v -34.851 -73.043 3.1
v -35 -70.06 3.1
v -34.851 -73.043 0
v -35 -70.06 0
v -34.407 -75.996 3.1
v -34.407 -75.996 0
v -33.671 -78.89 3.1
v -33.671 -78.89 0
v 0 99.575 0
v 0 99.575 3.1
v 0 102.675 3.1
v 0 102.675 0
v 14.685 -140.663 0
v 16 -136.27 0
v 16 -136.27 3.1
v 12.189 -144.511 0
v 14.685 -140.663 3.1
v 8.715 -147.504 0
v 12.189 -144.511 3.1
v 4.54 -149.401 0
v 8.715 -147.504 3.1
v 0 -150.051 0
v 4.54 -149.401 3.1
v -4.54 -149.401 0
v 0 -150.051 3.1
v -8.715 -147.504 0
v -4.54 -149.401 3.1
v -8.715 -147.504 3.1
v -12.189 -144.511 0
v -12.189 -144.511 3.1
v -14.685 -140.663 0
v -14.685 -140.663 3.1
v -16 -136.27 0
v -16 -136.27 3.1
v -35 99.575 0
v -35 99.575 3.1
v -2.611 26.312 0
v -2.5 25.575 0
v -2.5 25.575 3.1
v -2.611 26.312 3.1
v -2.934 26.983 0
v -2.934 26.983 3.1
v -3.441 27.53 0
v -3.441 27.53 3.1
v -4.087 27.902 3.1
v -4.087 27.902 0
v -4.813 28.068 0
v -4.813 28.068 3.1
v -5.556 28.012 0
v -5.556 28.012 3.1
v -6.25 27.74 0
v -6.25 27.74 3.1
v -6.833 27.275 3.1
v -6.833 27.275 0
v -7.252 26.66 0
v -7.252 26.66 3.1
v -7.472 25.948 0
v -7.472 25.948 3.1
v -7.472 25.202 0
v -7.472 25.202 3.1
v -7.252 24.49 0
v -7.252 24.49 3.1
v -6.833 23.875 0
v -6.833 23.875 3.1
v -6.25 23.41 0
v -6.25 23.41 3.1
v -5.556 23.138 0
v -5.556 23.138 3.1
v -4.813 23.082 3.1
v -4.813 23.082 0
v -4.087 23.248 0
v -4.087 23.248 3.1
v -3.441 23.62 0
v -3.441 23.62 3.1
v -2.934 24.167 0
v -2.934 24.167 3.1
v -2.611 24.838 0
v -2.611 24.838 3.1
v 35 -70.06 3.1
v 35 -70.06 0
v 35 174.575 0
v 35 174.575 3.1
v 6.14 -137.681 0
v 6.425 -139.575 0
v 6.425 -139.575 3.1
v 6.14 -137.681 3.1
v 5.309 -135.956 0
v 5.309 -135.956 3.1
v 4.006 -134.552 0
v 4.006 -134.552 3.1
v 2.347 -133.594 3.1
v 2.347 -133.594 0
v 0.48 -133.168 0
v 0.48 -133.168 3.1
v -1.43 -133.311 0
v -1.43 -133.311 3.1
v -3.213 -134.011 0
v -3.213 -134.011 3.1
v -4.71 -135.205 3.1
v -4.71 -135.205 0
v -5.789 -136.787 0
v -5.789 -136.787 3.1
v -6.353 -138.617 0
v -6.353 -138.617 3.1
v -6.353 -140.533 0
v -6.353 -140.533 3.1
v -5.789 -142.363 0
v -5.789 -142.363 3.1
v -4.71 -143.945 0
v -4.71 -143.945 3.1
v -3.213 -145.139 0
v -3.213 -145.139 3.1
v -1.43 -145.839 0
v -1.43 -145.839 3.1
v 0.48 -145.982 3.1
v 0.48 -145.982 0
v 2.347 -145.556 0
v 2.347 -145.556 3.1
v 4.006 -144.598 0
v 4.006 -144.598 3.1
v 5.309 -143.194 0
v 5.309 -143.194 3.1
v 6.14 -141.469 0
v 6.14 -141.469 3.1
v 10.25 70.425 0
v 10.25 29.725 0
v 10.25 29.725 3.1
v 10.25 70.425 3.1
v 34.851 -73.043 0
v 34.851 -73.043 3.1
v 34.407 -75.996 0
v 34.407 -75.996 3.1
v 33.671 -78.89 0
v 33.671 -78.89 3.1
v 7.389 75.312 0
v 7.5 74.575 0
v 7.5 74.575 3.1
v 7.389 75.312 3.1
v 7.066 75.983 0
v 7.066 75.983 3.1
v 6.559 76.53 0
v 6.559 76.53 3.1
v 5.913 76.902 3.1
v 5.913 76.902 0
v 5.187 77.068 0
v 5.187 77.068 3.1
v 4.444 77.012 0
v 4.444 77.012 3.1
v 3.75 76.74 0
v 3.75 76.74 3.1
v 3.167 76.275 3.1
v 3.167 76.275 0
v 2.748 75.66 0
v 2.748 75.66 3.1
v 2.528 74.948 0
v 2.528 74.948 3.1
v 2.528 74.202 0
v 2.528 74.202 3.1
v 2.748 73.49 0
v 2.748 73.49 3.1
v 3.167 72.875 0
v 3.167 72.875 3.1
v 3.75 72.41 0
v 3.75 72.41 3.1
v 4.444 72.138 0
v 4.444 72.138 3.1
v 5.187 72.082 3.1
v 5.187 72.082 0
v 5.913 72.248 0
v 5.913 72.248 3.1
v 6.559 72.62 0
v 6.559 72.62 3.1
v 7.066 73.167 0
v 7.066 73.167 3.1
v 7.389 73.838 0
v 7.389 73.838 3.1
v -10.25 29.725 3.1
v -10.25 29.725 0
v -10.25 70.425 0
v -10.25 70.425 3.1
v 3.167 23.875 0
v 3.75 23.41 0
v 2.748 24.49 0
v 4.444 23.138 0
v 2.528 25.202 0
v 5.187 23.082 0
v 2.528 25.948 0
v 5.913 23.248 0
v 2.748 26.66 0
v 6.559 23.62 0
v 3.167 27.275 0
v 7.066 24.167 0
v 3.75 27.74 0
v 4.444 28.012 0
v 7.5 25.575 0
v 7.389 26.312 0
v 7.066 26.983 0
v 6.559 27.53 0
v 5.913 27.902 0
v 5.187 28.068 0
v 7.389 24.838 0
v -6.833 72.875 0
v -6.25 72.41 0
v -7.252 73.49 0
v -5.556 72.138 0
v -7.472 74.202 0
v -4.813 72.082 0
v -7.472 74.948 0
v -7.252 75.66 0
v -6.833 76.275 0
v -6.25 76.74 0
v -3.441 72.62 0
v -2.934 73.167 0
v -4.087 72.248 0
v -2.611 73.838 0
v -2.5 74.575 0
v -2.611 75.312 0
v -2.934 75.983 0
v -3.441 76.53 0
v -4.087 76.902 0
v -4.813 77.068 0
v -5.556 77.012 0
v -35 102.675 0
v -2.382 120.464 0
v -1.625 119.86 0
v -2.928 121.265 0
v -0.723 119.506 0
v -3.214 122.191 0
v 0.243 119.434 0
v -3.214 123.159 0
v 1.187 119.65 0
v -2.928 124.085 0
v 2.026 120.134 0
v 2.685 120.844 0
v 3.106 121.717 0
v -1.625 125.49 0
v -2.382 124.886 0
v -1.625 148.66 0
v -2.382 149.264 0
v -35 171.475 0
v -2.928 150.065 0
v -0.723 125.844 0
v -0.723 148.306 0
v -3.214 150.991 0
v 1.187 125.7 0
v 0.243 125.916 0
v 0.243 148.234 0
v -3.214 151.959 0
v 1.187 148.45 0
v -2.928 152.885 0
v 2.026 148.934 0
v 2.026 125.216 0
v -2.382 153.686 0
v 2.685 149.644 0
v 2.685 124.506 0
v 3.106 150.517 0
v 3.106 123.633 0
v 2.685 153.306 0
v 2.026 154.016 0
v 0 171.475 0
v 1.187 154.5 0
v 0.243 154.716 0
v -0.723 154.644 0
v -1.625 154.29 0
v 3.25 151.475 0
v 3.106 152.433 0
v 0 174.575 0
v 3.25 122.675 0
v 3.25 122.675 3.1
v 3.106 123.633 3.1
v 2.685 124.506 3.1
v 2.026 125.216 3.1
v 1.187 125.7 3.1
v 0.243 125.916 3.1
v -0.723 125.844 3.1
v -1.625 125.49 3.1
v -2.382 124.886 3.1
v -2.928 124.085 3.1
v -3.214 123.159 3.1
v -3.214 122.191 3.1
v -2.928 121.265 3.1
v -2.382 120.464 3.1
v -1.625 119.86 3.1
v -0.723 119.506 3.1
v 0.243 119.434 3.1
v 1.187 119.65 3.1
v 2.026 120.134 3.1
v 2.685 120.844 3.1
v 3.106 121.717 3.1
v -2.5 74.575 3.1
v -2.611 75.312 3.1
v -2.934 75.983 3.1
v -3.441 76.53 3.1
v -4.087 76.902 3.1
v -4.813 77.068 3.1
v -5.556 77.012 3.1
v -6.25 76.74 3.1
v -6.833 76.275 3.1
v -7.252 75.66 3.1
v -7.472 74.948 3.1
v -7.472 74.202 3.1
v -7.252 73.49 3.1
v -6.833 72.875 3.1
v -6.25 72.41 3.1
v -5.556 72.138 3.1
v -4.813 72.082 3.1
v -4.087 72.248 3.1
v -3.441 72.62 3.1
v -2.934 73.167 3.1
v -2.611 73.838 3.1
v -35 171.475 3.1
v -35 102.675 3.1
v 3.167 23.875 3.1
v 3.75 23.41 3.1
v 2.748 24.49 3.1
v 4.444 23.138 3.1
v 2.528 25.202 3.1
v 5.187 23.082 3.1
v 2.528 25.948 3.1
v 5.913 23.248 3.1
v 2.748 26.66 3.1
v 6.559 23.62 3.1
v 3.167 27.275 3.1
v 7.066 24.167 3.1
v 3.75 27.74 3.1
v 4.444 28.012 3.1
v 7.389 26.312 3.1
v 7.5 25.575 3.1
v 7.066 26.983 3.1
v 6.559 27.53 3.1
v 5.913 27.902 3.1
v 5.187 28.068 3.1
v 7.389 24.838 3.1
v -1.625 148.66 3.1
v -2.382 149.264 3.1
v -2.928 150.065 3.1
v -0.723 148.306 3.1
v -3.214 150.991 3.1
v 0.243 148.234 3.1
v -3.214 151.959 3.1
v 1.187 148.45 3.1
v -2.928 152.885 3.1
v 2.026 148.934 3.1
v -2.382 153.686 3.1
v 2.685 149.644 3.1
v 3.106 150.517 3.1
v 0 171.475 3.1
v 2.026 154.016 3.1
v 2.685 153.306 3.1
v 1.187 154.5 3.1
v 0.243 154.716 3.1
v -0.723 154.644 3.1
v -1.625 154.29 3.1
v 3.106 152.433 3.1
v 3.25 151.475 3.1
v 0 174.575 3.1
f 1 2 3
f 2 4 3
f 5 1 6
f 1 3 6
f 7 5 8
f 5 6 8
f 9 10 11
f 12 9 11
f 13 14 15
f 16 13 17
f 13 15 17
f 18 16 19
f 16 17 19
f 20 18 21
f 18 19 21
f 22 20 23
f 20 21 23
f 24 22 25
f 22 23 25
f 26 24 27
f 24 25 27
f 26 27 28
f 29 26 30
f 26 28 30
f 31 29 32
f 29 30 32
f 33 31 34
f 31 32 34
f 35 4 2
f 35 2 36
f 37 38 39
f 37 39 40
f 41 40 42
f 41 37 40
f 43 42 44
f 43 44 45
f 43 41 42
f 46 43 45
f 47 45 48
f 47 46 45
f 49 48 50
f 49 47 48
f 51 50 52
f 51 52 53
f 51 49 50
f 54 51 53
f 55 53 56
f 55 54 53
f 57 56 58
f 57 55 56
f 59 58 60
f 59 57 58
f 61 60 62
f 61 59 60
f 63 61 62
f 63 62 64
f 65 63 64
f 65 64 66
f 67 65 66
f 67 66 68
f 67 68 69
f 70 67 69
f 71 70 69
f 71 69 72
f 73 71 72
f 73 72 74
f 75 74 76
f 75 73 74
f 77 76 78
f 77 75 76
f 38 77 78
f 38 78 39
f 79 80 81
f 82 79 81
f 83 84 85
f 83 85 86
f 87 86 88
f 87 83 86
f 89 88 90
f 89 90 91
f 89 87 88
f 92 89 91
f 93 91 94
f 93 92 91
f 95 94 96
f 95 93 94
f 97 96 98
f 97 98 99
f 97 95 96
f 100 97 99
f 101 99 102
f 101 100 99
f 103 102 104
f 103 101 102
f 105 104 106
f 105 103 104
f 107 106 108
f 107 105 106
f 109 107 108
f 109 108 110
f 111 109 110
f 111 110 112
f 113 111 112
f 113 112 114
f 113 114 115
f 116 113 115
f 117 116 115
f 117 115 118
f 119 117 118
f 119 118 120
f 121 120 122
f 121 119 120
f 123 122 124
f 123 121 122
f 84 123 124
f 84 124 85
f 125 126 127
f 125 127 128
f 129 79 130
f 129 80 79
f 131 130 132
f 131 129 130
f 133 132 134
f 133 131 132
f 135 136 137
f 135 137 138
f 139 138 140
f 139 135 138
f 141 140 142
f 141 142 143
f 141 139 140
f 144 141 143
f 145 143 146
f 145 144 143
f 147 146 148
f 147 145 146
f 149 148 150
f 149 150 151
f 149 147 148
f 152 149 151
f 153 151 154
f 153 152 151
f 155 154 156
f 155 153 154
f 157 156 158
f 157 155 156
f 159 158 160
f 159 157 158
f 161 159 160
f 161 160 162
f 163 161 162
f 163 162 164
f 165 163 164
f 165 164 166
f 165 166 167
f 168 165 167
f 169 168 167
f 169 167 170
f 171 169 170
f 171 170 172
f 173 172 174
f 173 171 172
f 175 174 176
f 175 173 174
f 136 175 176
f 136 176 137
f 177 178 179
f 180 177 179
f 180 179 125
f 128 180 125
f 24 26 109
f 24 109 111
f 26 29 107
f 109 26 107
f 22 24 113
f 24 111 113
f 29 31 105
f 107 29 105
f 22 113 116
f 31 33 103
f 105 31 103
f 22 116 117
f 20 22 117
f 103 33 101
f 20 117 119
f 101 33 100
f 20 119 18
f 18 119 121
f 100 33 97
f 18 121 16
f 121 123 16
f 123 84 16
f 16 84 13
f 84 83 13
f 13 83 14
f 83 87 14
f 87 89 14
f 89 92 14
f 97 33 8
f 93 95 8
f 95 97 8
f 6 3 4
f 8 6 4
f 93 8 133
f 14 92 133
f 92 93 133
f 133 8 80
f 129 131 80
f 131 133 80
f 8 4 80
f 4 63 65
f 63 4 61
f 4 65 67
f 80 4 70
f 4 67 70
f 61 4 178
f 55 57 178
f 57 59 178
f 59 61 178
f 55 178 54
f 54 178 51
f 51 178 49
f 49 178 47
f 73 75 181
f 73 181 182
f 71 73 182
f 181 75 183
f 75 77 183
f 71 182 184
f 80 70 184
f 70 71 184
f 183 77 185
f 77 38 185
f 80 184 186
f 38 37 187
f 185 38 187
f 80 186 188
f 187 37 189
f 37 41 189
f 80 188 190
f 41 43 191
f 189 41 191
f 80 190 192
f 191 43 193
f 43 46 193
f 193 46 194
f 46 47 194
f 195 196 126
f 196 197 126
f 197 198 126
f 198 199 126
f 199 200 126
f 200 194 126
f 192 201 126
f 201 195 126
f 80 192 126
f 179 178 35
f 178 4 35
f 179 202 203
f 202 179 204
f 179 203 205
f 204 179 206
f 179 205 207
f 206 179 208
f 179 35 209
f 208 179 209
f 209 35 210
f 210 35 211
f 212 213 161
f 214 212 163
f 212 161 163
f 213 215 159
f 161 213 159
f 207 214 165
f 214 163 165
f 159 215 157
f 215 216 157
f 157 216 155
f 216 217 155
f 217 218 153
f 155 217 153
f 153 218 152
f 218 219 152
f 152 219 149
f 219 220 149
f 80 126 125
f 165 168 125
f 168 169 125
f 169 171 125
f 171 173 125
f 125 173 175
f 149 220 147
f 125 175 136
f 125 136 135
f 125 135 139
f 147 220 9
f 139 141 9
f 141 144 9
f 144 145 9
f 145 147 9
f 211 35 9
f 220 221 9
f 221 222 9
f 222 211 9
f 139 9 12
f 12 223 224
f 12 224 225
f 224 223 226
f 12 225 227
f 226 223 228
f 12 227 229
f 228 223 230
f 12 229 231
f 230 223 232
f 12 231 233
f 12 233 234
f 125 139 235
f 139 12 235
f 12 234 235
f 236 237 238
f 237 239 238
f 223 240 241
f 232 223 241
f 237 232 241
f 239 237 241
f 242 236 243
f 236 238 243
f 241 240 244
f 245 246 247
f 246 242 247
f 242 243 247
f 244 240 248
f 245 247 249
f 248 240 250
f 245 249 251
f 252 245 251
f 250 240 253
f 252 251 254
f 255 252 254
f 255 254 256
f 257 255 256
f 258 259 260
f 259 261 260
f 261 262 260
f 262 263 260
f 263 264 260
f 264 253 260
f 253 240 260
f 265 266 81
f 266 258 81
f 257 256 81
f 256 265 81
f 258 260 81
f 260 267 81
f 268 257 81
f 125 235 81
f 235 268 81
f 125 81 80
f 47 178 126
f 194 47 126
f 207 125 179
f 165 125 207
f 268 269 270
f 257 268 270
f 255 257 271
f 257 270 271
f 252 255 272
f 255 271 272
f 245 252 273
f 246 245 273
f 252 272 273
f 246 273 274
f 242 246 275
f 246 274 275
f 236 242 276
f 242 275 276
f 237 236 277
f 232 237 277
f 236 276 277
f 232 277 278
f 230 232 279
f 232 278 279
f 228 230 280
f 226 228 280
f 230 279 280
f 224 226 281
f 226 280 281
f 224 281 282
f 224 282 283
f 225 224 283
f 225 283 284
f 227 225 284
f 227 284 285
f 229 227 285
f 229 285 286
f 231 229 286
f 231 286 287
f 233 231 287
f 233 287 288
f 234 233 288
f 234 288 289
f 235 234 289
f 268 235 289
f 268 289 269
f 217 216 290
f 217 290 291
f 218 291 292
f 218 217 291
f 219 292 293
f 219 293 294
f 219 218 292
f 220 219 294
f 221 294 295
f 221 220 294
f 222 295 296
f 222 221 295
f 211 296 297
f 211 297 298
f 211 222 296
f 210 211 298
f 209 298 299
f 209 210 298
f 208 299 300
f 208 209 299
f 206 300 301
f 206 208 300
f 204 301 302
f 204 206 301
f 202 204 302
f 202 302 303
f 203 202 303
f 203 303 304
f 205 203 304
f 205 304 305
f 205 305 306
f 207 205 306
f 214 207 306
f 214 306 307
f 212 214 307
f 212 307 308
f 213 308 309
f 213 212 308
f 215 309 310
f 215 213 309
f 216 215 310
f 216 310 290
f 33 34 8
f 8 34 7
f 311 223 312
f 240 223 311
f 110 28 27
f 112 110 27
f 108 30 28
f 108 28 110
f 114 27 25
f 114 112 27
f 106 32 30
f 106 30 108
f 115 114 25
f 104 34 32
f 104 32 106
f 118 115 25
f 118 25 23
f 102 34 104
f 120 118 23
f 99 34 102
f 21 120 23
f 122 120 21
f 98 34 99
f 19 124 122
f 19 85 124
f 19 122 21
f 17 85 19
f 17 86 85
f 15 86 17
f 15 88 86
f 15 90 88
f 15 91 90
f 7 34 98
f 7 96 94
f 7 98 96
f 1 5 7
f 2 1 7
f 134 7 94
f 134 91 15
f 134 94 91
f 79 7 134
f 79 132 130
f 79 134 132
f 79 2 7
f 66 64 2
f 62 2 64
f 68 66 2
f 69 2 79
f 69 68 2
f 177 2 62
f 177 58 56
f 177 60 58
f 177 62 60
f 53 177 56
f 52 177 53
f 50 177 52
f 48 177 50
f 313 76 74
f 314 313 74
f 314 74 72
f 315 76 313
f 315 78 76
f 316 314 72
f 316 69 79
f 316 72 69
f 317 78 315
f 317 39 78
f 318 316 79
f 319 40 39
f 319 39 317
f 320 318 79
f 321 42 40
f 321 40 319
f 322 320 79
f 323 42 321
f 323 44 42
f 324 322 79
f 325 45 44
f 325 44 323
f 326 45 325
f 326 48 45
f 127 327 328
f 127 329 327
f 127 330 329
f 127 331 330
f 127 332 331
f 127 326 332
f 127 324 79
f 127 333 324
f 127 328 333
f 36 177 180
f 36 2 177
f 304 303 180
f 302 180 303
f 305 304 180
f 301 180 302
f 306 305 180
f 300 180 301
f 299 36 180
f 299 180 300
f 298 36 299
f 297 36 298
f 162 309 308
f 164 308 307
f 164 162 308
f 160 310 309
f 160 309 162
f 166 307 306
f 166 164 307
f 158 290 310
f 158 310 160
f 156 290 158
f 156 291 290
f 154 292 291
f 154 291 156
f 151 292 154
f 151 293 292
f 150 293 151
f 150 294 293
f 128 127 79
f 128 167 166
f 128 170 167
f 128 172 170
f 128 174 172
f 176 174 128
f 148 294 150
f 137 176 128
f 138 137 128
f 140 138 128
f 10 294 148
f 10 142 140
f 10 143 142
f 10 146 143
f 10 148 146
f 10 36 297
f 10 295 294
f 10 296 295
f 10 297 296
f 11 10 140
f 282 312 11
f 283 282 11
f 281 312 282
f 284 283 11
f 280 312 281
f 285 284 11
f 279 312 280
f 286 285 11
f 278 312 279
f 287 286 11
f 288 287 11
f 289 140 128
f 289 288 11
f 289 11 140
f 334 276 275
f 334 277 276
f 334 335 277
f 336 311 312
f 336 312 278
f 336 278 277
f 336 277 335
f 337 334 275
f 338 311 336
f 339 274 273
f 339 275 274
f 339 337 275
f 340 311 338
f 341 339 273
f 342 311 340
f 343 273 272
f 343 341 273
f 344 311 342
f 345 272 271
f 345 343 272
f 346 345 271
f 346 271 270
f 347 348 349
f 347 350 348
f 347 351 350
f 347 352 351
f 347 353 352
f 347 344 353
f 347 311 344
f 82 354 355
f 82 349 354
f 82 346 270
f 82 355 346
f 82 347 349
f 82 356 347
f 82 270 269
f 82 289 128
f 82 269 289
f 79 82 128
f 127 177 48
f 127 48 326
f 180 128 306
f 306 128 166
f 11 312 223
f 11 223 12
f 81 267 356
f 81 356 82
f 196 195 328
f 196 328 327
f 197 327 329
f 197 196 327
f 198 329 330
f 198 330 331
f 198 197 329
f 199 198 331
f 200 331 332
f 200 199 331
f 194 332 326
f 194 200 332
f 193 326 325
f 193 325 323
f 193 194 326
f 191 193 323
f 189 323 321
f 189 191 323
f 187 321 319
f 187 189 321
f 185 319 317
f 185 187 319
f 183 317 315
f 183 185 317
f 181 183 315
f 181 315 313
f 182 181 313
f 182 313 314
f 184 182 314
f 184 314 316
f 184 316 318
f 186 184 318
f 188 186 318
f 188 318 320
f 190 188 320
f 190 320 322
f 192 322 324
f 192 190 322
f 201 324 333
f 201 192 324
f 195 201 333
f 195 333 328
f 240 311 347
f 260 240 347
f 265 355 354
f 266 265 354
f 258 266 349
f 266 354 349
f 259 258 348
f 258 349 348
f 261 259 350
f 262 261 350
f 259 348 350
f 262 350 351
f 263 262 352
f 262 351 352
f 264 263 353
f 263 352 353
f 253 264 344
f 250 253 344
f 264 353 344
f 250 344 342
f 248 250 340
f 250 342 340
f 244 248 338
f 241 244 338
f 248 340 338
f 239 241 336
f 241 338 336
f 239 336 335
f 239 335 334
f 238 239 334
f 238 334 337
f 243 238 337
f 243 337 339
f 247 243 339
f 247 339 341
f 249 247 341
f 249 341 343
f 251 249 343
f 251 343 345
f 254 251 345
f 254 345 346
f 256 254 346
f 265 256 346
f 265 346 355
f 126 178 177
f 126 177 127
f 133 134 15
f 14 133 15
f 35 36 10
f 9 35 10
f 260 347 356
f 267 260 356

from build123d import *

# Parameters (mm, degrees)
SKETCH1_W               = 70
SKETCH1_H               = 349.15
SKETCH1_R               = 6.425
SKETCH1_R_2             = 2.5
SKETCH1_W_2             = 20.5
SKETCH1_H_2             = 40.7
BOSS_EXTRUDE1_DEPTH     = 3.1
CUT_EXTRUDE1_DEPTH      = 1
CUT_EXTRUDE1_DEPTH_BACK = 4.1
FILLET2_R               = 30
SKETCH4_R               = 3.25
SKETCH4_W               = 35
SKETCH4_H               = 3.1
CUT_EXTRUDE2_DEPTH      = 4.1


with BuildPart() as part:
    # Sketch1 → Boss-Extrude1 (new body)
    with BuildSketch(Plane.XY):
        Rectangle(SKETCH1_W, SKETCH1_H)
        with Locations((0, -139.575)):
            Circle(SKETCH1_R, mode=Mode.SUBTRACT)
        with Locations((-5, 74.575)):
            Circle(SKETCH1_R_2, mode=Mode.SUBTRACT)
        with Locations((5, 74.575)):
            Circle(SKETCH1_R_2, mode=Mode.SUBTRACT)
        with Locations((5, 25.575)):
            Circle(SKETCH1_R_2, mode=Mode.SUBTRACT)
        with Locations((-5, 25.575)):
            Circle(SKETCH1_R_2, mode=Mode.SUBTRACT)
        with Locations((0, 50.075)):
            Rectangle(SKETCH1_W_2, SKETCH1_H_2, mode=Mode.SUBTRACT)
    extrude(amount=BOSS_EXTRUDE1_DEPTH)

    # Sketch2 → Cut-Extrude1 (cut, two sides)
    with BuildSketch(Plane.XY.offset(3.1)) as cut_extrude1_sk:
        with BuildLine():
            Line((-16, -136.269781362), (-35, -74.575))
            Line((-35, -74.575), (-35, -174.575))
            Line((-35, -174.575), (35, -174.575))
            Line((35, -174.575), (35, -74.575))
            Line((35, -74.575), (16, -136.269781362))
            ThreePointArc((16, -136.269781362), (0, -150.051383336), (-16, -136.269781362))
        make_face()
    extrude(amount=CUT_EXTRUDE1_DEPTH, mode=Mode.SUBTRACT)
    extrude(cut_extrude1_sk.sketch, amount=-CUT_EXTRUDE1_DEPTH_BACK, mode=Mode.SUBTRACT)

    # Fillet2
    fillet2_edges = [part.edges().sort_by_distance(p)[0] for p in [
        (-35, -74.575, 1.55),
        (35, -74.575, 1.55),
    ]]
    fillet(fillet2_edges, radius=FILLET2_R)

    # Sketch4 → Cut-Extrude2 (cut, through all)
    with BuildSketch(Plane.XY.offset(3.1)):
        with Locations((0, 122.675)):
            Circle(SKETCH4_R)
        with Locations((0, 151.475)):
            Circle(SKETCH4_R)
        with Locations((-17.5, 173.025)):
            Rectangle(SKETCH4_W, SKETCH4_H)
        with Locations((-17.5, 101.125)):
            Rectangle(SKETCH4_W, SKETCH4_H)
    extrude(amount=-CUT_EXTRUDE2_DEPTH, mode=Mode.SUBTRACT)


solid = part.part
